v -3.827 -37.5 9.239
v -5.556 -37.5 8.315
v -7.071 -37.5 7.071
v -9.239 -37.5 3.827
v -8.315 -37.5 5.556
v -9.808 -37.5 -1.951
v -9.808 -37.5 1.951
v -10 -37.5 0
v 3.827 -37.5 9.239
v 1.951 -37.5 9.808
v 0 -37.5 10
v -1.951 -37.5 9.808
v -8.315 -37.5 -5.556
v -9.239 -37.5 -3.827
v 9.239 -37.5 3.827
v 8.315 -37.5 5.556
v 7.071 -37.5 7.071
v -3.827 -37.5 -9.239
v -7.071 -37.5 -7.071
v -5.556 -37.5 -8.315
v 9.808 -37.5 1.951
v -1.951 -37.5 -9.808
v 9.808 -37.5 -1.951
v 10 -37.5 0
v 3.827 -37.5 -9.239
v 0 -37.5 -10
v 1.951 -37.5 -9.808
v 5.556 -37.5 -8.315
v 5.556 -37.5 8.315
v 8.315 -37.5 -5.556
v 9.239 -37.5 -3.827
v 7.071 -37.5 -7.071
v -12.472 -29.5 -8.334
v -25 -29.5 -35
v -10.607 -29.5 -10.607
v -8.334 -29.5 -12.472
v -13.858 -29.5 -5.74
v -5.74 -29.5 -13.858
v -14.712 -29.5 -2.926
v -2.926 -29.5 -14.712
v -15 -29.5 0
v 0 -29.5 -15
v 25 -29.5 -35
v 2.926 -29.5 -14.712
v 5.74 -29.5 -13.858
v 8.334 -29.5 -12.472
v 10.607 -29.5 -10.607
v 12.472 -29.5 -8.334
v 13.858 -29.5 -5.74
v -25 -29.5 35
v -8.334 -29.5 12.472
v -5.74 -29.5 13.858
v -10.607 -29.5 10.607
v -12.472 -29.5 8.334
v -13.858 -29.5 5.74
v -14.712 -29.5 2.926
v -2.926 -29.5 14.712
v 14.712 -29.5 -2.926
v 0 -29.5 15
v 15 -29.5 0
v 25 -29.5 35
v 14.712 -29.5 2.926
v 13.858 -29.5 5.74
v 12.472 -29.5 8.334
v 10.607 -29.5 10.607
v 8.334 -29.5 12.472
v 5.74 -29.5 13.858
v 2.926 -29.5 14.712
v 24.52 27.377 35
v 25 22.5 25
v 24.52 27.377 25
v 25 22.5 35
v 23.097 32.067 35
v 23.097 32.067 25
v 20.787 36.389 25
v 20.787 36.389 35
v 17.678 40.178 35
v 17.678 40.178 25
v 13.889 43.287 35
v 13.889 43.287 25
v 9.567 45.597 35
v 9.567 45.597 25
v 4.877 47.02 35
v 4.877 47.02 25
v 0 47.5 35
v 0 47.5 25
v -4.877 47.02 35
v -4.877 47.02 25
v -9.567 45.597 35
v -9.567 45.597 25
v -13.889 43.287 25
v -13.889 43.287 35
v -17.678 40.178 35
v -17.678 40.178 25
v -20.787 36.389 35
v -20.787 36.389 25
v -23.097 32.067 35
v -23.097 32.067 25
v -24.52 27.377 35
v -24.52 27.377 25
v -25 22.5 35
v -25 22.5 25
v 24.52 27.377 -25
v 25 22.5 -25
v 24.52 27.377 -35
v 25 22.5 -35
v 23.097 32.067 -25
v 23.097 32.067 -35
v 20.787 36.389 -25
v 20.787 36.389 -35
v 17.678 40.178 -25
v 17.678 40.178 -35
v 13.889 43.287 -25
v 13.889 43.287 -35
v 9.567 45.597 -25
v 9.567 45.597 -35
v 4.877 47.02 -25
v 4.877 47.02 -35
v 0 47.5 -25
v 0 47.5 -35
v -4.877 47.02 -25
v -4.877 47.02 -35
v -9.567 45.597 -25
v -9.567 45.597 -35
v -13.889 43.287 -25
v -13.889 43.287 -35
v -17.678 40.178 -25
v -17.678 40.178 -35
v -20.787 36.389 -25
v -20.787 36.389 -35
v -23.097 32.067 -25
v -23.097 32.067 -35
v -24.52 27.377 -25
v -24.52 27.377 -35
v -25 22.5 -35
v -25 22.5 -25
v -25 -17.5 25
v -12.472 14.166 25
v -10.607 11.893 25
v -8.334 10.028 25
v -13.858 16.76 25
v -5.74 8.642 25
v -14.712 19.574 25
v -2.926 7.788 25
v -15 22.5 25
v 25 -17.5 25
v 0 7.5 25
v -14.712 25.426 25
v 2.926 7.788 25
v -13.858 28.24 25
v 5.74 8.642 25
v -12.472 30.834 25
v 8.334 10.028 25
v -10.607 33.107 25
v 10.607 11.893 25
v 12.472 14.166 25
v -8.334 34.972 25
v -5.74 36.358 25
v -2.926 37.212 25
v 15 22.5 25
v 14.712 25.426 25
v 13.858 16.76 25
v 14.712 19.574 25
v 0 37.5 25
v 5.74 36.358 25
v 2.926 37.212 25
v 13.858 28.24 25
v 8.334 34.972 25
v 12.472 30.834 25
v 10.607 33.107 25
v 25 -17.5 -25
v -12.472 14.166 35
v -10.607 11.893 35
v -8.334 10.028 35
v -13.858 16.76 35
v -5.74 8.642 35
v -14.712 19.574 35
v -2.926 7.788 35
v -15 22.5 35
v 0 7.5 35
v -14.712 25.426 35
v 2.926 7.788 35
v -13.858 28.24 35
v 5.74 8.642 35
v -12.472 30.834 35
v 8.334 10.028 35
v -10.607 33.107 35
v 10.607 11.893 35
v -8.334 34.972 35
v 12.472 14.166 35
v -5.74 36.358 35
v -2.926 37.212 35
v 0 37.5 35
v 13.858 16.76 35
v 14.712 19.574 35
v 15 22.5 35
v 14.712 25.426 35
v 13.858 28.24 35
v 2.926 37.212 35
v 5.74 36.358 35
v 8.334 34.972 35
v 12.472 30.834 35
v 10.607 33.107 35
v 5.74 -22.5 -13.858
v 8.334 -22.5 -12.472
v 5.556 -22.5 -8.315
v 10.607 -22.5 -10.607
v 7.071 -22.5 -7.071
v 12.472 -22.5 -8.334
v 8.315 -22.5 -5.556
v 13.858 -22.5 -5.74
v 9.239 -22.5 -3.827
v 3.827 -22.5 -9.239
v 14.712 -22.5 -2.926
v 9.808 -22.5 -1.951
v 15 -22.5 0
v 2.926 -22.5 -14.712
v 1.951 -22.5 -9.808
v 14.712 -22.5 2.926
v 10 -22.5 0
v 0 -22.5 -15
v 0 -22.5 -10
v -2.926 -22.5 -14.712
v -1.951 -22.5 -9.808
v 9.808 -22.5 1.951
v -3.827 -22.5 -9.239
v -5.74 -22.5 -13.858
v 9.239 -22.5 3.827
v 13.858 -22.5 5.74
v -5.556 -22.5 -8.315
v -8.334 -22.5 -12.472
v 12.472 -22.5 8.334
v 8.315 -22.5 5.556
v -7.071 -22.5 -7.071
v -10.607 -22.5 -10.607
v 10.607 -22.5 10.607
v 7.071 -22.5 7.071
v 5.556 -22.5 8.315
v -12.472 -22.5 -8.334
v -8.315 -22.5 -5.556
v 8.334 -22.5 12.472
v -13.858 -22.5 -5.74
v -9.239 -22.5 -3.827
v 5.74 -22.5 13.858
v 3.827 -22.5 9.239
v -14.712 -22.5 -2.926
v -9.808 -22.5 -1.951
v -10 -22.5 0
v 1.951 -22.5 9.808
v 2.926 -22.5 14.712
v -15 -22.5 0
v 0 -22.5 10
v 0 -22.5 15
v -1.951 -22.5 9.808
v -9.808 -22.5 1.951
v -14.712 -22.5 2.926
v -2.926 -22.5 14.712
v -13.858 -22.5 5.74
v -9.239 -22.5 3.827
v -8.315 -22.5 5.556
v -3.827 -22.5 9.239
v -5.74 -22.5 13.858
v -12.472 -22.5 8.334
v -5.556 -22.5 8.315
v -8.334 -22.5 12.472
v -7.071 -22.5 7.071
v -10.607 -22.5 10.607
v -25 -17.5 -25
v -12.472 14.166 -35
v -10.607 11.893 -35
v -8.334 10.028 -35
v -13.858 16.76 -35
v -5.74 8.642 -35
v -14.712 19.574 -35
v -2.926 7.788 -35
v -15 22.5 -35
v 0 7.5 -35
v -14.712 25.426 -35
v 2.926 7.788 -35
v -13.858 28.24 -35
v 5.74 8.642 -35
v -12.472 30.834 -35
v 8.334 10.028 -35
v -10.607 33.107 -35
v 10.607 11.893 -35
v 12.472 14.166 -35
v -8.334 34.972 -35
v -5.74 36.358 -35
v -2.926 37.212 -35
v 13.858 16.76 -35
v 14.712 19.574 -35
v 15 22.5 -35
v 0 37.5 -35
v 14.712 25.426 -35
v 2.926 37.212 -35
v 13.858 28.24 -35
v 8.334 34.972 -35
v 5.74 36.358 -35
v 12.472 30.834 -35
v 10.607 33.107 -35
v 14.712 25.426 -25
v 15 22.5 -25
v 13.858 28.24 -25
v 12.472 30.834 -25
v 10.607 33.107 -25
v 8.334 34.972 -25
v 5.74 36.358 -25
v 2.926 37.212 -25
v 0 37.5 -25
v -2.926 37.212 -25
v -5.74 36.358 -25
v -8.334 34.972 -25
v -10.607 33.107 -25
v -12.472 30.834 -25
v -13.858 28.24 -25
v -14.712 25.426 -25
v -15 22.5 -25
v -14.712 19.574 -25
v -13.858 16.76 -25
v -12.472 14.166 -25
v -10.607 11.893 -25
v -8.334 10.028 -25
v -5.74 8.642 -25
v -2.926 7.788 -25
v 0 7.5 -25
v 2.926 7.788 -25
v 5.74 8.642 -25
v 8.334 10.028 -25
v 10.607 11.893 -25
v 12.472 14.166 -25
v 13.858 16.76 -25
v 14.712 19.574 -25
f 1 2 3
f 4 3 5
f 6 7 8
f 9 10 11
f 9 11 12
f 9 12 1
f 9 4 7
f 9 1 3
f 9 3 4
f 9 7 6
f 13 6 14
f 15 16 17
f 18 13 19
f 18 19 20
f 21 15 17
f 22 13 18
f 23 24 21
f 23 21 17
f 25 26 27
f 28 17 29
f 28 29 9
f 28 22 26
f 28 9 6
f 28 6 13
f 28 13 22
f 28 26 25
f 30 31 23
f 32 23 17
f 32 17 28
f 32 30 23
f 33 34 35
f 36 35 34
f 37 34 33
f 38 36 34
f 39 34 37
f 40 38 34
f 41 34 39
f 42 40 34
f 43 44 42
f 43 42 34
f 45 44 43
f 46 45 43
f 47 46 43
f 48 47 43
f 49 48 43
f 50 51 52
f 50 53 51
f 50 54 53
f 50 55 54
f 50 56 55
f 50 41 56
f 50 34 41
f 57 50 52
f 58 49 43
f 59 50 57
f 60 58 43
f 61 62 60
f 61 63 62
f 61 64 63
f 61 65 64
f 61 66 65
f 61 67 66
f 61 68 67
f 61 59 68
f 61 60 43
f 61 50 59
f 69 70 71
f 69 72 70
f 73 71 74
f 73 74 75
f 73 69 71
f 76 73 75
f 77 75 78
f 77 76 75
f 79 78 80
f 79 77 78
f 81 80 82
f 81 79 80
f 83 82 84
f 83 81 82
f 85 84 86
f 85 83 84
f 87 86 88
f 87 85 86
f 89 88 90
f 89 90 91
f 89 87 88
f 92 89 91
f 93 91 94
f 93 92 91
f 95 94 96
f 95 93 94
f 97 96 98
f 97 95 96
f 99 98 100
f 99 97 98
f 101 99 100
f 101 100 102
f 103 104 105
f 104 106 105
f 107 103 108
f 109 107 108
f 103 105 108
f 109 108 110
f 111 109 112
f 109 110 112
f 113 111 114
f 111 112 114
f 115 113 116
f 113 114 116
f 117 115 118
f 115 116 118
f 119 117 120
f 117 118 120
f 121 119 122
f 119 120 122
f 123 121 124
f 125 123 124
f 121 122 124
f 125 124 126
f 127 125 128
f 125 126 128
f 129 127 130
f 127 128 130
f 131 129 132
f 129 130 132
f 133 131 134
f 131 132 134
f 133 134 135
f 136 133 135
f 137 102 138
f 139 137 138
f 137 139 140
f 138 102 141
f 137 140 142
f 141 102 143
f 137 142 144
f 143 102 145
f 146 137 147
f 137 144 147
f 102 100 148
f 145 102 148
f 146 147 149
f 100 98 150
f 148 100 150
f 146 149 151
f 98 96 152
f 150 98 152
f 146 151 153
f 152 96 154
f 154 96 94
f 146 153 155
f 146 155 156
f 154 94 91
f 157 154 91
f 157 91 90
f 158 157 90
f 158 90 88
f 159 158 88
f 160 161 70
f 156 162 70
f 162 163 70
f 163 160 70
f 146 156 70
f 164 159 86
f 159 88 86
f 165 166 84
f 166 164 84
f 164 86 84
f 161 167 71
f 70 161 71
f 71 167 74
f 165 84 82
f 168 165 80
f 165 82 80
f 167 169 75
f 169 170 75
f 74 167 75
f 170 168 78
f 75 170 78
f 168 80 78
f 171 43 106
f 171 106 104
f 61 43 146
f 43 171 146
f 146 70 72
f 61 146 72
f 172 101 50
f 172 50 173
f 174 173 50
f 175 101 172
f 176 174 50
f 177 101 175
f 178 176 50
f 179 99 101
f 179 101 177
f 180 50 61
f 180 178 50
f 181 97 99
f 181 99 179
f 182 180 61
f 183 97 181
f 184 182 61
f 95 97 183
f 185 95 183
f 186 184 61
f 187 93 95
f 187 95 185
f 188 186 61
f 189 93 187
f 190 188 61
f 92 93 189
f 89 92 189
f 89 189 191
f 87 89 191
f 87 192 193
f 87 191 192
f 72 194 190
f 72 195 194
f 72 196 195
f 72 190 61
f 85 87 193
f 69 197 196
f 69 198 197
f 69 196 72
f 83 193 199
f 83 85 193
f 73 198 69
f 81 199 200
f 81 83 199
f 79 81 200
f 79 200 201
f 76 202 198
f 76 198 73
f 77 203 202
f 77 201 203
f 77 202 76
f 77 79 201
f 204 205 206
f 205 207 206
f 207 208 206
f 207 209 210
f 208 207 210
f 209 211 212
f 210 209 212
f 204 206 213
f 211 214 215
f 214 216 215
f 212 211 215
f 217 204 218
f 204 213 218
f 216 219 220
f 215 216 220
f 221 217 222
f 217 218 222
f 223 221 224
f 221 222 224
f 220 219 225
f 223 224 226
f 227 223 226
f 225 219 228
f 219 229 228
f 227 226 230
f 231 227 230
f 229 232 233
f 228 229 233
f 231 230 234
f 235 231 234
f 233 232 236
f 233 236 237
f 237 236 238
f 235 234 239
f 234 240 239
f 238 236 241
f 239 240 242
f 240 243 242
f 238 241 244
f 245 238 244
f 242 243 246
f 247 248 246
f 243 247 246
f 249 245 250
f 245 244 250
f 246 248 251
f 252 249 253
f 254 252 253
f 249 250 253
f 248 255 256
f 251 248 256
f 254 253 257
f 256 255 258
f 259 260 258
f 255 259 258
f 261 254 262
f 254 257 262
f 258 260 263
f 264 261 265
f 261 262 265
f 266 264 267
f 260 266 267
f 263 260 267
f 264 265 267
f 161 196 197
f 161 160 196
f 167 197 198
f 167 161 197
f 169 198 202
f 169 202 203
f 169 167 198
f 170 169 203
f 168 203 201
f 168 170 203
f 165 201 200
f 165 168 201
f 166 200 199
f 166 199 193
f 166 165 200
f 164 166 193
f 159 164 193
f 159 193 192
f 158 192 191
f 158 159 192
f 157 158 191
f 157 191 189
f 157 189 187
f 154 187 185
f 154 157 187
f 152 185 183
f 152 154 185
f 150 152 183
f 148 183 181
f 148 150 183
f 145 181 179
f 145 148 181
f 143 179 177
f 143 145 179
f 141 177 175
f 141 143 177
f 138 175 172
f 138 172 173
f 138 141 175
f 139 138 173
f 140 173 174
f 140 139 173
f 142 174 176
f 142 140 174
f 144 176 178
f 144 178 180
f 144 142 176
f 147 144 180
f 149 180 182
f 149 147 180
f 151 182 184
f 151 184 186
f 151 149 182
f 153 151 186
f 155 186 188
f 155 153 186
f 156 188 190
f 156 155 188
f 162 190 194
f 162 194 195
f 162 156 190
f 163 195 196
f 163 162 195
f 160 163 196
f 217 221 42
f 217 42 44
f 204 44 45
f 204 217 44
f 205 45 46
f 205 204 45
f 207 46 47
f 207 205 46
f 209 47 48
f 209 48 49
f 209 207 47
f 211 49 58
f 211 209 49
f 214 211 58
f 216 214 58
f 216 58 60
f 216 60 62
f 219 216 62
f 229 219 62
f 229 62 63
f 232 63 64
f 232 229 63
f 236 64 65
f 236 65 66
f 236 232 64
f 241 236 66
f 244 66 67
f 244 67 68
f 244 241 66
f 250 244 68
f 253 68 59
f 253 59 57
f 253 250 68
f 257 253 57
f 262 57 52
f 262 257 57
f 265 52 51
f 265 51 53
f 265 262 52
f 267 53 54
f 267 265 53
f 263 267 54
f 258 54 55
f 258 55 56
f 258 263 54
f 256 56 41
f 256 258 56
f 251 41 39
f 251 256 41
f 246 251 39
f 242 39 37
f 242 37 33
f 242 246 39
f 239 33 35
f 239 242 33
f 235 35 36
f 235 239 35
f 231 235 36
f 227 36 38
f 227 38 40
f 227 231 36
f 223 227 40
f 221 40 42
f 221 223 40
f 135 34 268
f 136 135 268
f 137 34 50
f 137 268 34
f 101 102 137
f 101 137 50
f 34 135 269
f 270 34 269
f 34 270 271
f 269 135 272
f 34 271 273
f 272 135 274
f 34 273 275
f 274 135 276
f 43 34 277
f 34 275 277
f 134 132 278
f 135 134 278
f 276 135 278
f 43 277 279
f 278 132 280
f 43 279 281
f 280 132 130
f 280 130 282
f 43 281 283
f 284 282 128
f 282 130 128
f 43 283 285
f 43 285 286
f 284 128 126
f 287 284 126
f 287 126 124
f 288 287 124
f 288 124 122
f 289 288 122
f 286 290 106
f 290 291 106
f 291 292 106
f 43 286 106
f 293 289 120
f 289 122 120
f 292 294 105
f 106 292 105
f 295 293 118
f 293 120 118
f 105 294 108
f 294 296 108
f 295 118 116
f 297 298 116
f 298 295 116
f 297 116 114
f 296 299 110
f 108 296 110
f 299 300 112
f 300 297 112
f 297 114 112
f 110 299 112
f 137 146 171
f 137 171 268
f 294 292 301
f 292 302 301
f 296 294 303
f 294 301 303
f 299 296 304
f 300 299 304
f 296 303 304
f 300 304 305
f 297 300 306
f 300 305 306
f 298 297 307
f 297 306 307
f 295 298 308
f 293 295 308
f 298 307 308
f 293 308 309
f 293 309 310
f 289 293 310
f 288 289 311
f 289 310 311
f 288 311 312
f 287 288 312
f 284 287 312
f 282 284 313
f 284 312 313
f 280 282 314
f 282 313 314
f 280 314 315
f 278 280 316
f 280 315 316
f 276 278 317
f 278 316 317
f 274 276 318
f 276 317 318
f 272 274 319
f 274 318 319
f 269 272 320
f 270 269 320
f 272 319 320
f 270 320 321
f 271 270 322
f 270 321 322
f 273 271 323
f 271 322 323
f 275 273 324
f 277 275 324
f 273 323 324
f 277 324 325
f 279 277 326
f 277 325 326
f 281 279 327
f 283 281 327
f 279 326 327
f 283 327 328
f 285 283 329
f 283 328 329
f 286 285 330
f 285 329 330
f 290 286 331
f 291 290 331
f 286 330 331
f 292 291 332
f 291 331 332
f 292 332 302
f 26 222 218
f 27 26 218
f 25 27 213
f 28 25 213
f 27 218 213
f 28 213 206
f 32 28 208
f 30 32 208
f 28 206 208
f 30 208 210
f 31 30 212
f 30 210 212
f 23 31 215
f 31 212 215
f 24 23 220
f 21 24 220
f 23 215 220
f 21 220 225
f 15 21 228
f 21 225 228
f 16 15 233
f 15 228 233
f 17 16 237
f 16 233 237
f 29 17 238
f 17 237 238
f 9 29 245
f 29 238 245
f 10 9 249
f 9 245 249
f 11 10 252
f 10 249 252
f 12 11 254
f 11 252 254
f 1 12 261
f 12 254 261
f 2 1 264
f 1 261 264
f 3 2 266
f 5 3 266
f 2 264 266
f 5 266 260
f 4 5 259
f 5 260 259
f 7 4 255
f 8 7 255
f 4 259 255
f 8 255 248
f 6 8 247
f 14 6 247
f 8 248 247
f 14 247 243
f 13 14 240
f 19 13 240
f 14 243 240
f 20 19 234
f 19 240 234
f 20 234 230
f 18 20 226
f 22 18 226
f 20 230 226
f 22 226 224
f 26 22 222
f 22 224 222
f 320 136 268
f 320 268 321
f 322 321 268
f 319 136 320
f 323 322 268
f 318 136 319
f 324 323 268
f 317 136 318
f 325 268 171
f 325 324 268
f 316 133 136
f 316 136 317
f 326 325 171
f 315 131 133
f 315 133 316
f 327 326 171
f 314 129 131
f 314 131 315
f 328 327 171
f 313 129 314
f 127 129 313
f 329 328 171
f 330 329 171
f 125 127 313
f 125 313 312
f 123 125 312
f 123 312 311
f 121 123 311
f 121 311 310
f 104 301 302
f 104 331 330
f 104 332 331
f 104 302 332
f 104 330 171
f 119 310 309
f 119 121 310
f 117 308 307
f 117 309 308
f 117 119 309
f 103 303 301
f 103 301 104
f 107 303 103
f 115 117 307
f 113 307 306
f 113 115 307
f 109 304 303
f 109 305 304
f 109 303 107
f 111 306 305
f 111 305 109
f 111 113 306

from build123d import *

# Parameters (mm, degrees)
SKETCH2_R           = 15
BOSS_EXTRUDE2_DEPTH = 5
SKETCH3_W           = 50
SKETCH3_H           = 5
BOSS_EXTRUDE3_DEPTH = 60
SKETCH4_R           = 10
BOSS_EXTRUDE4_DEPTH = 15
SKETCH5_W           = 50
SKETCH5_H           = 70
SKETCH5_R           = 15
BOSS_EXTRUDE5_DEPTH = 7


with BuildPart() as part:
    # Sketch2 → Boss-Extrude2 (new, symmetric)
    with BuildSketch(Plane.XY.offset(30)):
        with BuildLine():
            Line((-25, 22.5), (-25, -22.5))
            Line((-25, -22.5), (25, -22.5))
            Line((25, -22.5), (25, 22.5))
            ThreePointArc((25, 22.5), (0, 47.5), (-25, 22.5))
        make_face()
        with Locations((0, 22.5)):
            Circle(SKETCH2_R, mode=Mode.SUBTRACT)
    boss_extrude2 = extrude(amount=BOSS_EXTRUDE2_DEPTH, both=True)

    # Sketch3 → Boss-Extrude3 (add)
    with BuildSketch(Plane(origin=(0, 0, 25), x_dir=(-1, 0, 0), z_dir=(0, 0, -1))):
        with Locations((0, -20)):
            Rectangle(SKETCH3_W, SKETCH3_H)
    extrude(amount=BOSS_EXTRUDE3_DEPTH)

    # Mirror3: Boss-Extrude2 across plane
    add(boss_extrude2.mirror(Plane.XY))

    # Sketch4 → Boss-Extrude4 (add)
    with BuildSketch(Plane.XZ.offset(22.5)):
        with Locations(Location((0, 0, 0), (0, 0, 270))):
            Circle(SKETCH4_R)
    extrude(amount=BOSS_EXTRUDE4_DEPTH)

    # Sketch5 → Boss-Extrude5 (add)
    with BuildSketch(Plane.XZ.offset(22.5)):
        Rectangle(SKETCH5_W, SKETCH5_H)
        with Locations(Location((0, 0, 0), (0, 0, 270))):
            Circle(SKETCH5_R, mode=Mode.SUBTRACT)
    extrude(amount=BOSS_EXTRUDE5_DEPTH)


solid = part.part
